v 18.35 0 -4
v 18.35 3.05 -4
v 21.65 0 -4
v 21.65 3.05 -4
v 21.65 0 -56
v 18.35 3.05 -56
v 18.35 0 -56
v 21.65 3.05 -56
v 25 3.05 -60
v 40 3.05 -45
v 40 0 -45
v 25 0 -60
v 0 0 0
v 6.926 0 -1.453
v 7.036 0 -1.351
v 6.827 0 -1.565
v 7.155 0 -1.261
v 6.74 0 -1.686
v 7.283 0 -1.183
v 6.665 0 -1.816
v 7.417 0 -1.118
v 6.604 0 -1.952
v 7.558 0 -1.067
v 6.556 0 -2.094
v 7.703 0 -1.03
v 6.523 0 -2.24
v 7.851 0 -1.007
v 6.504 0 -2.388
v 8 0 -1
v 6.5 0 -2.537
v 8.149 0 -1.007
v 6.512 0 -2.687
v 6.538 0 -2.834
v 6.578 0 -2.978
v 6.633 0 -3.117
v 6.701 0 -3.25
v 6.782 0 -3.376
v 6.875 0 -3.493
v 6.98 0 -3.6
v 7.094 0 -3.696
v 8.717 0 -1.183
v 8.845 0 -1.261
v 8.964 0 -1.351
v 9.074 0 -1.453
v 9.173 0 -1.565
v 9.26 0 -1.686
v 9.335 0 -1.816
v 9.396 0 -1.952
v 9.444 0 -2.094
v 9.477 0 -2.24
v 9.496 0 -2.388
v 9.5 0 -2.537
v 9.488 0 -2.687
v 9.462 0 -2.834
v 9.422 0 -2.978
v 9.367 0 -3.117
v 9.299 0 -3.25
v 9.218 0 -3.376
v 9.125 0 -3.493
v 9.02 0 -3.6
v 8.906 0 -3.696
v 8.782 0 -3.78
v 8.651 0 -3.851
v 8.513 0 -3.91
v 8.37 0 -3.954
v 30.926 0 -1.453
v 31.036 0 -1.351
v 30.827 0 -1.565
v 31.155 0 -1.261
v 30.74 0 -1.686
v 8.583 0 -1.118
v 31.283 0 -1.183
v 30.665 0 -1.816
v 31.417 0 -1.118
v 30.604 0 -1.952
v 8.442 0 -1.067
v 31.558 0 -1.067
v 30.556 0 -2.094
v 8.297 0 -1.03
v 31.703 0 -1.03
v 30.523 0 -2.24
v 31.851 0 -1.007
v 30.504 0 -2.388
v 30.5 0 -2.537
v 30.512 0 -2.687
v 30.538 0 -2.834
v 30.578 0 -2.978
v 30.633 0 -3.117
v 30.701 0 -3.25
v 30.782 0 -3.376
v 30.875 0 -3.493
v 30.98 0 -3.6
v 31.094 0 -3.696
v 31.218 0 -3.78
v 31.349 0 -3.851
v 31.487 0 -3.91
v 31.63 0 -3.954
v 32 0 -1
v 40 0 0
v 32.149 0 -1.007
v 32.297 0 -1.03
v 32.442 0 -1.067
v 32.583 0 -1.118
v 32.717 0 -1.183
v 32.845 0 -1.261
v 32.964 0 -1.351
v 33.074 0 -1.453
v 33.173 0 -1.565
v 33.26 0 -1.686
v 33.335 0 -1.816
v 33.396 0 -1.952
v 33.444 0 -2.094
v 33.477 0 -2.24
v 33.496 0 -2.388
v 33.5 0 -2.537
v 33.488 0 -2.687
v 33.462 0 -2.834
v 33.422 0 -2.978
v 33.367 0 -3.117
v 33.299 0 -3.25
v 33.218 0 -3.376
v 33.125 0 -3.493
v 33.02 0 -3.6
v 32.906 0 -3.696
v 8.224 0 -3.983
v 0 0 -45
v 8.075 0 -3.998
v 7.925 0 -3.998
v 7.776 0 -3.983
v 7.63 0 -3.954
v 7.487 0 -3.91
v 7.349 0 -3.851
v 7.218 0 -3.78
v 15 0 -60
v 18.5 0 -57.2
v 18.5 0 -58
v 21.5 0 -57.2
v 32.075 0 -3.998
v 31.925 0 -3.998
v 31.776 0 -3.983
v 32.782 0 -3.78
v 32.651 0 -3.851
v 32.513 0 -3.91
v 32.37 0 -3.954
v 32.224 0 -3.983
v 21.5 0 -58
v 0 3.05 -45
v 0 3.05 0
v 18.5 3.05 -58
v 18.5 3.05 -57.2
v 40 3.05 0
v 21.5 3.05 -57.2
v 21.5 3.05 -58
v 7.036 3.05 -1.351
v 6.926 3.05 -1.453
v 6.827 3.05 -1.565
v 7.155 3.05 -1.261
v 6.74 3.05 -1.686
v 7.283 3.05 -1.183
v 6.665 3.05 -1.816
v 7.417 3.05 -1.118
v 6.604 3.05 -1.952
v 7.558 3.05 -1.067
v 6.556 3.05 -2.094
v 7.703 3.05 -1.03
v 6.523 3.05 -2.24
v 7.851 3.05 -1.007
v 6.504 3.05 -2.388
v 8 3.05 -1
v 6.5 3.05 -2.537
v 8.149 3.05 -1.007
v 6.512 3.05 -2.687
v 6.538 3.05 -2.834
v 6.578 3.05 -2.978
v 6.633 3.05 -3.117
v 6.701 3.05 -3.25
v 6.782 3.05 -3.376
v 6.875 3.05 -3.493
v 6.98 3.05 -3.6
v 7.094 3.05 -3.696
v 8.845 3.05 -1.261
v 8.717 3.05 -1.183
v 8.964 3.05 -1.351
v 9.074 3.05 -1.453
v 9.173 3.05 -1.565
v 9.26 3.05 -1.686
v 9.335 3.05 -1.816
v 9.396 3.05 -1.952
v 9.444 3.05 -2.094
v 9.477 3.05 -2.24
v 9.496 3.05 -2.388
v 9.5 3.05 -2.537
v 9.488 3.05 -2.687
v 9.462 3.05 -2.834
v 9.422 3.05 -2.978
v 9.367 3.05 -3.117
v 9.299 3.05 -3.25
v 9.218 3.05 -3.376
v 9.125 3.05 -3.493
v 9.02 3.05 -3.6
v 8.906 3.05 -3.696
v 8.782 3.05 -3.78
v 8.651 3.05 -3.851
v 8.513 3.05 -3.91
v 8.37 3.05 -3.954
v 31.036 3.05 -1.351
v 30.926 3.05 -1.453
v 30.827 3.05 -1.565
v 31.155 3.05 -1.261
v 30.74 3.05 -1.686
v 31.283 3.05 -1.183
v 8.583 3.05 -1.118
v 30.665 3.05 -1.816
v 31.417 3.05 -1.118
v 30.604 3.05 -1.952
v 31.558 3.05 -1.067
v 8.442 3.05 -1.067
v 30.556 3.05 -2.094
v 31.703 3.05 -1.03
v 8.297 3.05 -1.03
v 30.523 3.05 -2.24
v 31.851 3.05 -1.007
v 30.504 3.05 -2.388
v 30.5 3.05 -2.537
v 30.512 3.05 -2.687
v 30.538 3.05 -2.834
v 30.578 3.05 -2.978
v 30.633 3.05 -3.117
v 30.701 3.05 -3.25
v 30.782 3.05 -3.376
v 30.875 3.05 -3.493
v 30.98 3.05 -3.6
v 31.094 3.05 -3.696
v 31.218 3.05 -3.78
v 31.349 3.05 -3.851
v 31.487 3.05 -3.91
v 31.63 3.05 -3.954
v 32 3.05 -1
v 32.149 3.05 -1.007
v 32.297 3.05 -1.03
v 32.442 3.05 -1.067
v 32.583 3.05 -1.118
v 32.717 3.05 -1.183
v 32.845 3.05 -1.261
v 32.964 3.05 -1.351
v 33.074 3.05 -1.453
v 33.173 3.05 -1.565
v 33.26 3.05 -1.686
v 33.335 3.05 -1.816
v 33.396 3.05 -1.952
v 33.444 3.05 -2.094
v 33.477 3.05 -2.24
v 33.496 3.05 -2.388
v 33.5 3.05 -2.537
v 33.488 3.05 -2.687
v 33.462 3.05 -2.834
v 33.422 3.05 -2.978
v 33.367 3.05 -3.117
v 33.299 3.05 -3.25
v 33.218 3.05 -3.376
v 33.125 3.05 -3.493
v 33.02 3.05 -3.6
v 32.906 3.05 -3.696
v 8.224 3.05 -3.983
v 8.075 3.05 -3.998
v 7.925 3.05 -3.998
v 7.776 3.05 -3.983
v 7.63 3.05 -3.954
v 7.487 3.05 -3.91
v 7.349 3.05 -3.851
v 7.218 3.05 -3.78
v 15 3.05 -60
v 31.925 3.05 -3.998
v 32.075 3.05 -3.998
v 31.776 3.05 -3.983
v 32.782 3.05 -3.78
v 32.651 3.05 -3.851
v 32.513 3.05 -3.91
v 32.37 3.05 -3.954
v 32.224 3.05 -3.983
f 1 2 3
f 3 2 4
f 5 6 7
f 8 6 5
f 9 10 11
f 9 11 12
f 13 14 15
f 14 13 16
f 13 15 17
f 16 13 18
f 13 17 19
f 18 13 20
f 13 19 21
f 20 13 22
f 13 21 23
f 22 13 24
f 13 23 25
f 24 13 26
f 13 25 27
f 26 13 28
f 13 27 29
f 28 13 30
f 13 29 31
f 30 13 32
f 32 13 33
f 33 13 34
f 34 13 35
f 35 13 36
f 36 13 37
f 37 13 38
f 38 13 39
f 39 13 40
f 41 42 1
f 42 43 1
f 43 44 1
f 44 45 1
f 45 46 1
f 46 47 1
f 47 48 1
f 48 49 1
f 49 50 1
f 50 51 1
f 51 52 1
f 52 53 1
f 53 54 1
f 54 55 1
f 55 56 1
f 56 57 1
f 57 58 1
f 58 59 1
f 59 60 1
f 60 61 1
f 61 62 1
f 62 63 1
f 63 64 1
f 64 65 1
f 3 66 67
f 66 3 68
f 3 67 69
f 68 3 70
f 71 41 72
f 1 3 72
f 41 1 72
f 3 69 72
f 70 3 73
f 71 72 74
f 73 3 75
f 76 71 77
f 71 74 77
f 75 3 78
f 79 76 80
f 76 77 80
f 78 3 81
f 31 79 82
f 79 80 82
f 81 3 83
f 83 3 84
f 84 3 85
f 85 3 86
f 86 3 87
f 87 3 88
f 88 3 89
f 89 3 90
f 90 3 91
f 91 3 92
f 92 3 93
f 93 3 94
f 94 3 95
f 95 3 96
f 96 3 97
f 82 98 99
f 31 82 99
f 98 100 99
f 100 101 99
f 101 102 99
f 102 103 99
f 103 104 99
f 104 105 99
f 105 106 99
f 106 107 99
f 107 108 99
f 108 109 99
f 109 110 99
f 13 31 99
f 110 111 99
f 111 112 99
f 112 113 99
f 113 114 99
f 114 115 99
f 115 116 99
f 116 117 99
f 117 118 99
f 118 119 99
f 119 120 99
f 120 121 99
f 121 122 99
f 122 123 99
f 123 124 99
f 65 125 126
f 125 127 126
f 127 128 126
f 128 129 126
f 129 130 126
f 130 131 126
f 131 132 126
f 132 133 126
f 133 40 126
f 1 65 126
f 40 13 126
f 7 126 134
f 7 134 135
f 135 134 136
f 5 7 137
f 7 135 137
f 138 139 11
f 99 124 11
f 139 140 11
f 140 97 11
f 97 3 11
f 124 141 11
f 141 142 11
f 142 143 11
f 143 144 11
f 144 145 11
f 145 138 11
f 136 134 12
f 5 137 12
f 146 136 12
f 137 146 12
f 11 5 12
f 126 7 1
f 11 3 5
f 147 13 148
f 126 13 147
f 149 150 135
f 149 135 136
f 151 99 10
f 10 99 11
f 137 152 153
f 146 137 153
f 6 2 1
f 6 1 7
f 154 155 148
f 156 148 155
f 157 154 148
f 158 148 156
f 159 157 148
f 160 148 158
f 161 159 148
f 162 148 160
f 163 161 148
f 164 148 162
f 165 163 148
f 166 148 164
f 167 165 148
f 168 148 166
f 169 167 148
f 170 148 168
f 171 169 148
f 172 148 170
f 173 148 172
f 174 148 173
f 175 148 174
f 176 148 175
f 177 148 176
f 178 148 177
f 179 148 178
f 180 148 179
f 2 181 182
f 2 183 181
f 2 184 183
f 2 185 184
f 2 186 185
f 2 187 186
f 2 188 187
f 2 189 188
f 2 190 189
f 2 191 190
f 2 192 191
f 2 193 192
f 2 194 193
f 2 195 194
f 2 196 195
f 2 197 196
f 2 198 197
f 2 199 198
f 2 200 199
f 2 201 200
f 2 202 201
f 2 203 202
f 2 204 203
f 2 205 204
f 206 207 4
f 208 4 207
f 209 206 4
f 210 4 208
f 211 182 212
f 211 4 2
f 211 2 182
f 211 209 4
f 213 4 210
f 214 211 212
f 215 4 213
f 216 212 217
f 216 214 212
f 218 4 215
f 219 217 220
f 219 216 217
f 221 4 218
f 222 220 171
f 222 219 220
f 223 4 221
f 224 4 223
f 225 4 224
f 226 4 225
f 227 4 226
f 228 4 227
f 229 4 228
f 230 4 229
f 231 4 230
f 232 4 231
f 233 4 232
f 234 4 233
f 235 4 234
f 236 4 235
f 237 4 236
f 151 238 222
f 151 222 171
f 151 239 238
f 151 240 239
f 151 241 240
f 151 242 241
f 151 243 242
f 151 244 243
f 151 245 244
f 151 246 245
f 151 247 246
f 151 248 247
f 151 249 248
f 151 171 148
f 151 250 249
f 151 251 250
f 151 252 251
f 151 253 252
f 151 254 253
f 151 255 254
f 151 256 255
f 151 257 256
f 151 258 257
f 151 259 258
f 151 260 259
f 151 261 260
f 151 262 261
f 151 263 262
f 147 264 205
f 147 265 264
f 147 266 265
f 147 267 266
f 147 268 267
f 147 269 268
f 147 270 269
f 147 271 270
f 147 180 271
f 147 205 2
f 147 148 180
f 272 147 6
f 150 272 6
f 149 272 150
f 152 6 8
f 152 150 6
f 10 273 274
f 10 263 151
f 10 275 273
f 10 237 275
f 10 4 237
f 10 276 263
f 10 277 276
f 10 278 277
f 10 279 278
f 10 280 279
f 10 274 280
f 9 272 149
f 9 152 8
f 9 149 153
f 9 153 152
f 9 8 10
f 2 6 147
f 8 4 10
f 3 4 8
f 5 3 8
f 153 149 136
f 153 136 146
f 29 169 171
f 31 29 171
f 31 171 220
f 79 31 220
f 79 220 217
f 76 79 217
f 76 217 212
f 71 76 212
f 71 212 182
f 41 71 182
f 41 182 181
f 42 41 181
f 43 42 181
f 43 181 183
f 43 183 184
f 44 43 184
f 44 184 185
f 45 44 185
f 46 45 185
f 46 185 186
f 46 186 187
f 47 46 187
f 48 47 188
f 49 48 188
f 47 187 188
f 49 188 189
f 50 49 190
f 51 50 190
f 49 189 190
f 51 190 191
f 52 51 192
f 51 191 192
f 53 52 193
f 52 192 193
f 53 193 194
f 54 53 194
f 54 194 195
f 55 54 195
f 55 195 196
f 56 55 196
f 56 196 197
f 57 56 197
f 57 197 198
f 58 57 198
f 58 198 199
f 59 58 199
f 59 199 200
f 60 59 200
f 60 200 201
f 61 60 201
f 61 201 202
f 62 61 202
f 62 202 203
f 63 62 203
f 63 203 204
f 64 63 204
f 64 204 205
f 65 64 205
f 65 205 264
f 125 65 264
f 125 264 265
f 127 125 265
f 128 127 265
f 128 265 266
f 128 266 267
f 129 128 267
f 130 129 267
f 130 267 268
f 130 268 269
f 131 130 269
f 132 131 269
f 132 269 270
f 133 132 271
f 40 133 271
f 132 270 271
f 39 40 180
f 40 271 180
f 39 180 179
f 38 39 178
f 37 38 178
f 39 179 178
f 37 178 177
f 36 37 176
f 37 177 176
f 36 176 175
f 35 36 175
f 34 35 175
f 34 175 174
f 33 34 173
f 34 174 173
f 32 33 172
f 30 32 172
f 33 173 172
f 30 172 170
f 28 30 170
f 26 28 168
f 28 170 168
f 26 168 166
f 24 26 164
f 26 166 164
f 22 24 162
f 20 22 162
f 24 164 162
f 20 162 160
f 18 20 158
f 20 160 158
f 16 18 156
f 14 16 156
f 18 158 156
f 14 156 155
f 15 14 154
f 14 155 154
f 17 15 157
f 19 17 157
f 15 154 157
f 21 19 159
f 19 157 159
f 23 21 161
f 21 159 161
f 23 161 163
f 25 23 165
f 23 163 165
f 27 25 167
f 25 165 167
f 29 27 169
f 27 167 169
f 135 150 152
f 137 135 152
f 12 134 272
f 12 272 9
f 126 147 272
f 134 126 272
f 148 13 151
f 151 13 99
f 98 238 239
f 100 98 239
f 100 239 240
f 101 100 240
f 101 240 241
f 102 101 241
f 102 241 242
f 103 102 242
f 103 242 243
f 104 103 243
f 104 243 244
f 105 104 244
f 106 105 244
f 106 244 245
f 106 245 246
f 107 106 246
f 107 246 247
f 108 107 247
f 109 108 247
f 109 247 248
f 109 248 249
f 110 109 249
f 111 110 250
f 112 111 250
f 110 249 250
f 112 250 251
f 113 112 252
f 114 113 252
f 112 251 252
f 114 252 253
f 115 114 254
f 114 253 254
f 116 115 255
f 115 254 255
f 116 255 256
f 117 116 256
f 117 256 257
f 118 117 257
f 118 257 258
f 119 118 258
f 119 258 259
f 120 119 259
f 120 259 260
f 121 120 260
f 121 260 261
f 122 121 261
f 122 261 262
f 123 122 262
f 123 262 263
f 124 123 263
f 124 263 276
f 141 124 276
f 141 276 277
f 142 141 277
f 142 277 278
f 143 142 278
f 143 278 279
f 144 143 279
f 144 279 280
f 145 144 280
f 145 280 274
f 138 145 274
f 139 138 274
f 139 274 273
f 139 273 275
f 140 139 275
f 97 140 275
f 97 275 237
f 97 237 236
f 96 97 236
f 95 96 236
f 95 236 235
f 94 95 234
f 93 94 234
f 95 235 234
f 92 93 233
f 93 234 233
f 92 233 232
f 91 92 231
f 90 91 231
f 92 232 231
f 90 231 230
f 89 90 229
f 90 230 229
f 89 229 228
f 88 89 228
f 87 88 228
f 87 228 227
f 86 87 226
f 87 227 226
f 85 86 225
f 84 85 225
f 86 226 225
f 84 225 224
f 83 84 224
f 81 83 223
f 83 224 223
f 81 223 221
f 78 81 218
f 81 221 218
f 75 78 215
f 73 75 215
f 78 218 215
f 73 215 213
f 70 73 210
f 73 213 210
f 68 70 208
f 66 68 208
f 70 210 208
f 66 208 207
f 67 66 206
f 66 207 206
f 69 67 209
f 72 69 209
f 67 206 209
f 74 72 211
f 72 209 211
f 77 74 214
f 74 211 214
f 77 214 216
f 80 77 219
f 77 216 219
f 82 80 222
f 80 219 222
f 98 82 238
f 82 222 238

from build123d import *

# Parameters (mm, degrees)
SKETCH1_W           = 40
SKETCH1_H           = 60
BOSS_EXTRUDE1_DEPTH = 3.05
SKETCH4_W           = 3.3
SKETCH4_H           = 52
SKETCH4_W_2         = 3
SKETCH4_H_2         = 0.8
CUT_EXTRUDE1_DEPTH  = 10
CUT_EXTRUDE3_DEPTH  = 10
SKETCH7_R           = 1.5
CUT_EXTRUDE4_DEPTH  = 10


with BuildPart() as part:
    # Sketch1 → Boss-Extrude1 (new body)
    with BuildSketch(Plane(origin=(0, 0, 0), x_dir=(1, 0, 0), z_dir=(0, 1, 0))):
        with Locations((20, 30)):
            Rectangle(SKETCH1_W, SKETCH1_H)
    extrude(amount=BOSS_EXTRUDE1_DEPTH)

    # Sketch4 → Cut-Extrude1 (cut)
    with BuildSketch(Plane(origin=(0, 3.05, 0), x_dir=(1, 0, 0), z_dir=(0, 1, 0))):
        with Locations((20, 30)):
            Rectangle(SKETCH4_W, SKETCH4_H)
        with Locations((20, 57.6)):
            Rectangle(SKETCH4_W_2, SKETCH4_H_2)
    extrude(amount=-CUT_EXTRUDE1_DEPTH, mode=Mode.SUBTRACT)

    # Sketch6 → Cut-Extrude3 (cut)
    with BuildSketch(Plane(origin=(0, 3.05, 0), x_dir=(1, 0, 0), z_dir=(0, 1, 0))):
        Polygon((0, 60), (0, 45), (15, 60), align=None)
        Polygon((40, 60), (40, 45), (25, 60), align=None)
    extrude(amount=-CUT_EXTRUDE3_DEPTH, mode=Mode.SUBTRACT)

    # Sketch7 → Cut-Extrude4 (cut)
    with BuildSketch(Plane(origin=(0, 3.05, 0), x_dir=(1, 0, 0), z_dir=(0, 1, 0))):
        with Locations(Location((8, 2.5, 0), (0, 0, 270))):
            Circle(SKETCH7_R)
        with Locations(Location((32, 2.5, 0), (0, 0, 270))):
            Circle(SKETCH7_R)
    extrude(amount=-CUT_EXTRUDE4_DEPTH, mode=Mode.SUBTRACT)


solid = part.part
